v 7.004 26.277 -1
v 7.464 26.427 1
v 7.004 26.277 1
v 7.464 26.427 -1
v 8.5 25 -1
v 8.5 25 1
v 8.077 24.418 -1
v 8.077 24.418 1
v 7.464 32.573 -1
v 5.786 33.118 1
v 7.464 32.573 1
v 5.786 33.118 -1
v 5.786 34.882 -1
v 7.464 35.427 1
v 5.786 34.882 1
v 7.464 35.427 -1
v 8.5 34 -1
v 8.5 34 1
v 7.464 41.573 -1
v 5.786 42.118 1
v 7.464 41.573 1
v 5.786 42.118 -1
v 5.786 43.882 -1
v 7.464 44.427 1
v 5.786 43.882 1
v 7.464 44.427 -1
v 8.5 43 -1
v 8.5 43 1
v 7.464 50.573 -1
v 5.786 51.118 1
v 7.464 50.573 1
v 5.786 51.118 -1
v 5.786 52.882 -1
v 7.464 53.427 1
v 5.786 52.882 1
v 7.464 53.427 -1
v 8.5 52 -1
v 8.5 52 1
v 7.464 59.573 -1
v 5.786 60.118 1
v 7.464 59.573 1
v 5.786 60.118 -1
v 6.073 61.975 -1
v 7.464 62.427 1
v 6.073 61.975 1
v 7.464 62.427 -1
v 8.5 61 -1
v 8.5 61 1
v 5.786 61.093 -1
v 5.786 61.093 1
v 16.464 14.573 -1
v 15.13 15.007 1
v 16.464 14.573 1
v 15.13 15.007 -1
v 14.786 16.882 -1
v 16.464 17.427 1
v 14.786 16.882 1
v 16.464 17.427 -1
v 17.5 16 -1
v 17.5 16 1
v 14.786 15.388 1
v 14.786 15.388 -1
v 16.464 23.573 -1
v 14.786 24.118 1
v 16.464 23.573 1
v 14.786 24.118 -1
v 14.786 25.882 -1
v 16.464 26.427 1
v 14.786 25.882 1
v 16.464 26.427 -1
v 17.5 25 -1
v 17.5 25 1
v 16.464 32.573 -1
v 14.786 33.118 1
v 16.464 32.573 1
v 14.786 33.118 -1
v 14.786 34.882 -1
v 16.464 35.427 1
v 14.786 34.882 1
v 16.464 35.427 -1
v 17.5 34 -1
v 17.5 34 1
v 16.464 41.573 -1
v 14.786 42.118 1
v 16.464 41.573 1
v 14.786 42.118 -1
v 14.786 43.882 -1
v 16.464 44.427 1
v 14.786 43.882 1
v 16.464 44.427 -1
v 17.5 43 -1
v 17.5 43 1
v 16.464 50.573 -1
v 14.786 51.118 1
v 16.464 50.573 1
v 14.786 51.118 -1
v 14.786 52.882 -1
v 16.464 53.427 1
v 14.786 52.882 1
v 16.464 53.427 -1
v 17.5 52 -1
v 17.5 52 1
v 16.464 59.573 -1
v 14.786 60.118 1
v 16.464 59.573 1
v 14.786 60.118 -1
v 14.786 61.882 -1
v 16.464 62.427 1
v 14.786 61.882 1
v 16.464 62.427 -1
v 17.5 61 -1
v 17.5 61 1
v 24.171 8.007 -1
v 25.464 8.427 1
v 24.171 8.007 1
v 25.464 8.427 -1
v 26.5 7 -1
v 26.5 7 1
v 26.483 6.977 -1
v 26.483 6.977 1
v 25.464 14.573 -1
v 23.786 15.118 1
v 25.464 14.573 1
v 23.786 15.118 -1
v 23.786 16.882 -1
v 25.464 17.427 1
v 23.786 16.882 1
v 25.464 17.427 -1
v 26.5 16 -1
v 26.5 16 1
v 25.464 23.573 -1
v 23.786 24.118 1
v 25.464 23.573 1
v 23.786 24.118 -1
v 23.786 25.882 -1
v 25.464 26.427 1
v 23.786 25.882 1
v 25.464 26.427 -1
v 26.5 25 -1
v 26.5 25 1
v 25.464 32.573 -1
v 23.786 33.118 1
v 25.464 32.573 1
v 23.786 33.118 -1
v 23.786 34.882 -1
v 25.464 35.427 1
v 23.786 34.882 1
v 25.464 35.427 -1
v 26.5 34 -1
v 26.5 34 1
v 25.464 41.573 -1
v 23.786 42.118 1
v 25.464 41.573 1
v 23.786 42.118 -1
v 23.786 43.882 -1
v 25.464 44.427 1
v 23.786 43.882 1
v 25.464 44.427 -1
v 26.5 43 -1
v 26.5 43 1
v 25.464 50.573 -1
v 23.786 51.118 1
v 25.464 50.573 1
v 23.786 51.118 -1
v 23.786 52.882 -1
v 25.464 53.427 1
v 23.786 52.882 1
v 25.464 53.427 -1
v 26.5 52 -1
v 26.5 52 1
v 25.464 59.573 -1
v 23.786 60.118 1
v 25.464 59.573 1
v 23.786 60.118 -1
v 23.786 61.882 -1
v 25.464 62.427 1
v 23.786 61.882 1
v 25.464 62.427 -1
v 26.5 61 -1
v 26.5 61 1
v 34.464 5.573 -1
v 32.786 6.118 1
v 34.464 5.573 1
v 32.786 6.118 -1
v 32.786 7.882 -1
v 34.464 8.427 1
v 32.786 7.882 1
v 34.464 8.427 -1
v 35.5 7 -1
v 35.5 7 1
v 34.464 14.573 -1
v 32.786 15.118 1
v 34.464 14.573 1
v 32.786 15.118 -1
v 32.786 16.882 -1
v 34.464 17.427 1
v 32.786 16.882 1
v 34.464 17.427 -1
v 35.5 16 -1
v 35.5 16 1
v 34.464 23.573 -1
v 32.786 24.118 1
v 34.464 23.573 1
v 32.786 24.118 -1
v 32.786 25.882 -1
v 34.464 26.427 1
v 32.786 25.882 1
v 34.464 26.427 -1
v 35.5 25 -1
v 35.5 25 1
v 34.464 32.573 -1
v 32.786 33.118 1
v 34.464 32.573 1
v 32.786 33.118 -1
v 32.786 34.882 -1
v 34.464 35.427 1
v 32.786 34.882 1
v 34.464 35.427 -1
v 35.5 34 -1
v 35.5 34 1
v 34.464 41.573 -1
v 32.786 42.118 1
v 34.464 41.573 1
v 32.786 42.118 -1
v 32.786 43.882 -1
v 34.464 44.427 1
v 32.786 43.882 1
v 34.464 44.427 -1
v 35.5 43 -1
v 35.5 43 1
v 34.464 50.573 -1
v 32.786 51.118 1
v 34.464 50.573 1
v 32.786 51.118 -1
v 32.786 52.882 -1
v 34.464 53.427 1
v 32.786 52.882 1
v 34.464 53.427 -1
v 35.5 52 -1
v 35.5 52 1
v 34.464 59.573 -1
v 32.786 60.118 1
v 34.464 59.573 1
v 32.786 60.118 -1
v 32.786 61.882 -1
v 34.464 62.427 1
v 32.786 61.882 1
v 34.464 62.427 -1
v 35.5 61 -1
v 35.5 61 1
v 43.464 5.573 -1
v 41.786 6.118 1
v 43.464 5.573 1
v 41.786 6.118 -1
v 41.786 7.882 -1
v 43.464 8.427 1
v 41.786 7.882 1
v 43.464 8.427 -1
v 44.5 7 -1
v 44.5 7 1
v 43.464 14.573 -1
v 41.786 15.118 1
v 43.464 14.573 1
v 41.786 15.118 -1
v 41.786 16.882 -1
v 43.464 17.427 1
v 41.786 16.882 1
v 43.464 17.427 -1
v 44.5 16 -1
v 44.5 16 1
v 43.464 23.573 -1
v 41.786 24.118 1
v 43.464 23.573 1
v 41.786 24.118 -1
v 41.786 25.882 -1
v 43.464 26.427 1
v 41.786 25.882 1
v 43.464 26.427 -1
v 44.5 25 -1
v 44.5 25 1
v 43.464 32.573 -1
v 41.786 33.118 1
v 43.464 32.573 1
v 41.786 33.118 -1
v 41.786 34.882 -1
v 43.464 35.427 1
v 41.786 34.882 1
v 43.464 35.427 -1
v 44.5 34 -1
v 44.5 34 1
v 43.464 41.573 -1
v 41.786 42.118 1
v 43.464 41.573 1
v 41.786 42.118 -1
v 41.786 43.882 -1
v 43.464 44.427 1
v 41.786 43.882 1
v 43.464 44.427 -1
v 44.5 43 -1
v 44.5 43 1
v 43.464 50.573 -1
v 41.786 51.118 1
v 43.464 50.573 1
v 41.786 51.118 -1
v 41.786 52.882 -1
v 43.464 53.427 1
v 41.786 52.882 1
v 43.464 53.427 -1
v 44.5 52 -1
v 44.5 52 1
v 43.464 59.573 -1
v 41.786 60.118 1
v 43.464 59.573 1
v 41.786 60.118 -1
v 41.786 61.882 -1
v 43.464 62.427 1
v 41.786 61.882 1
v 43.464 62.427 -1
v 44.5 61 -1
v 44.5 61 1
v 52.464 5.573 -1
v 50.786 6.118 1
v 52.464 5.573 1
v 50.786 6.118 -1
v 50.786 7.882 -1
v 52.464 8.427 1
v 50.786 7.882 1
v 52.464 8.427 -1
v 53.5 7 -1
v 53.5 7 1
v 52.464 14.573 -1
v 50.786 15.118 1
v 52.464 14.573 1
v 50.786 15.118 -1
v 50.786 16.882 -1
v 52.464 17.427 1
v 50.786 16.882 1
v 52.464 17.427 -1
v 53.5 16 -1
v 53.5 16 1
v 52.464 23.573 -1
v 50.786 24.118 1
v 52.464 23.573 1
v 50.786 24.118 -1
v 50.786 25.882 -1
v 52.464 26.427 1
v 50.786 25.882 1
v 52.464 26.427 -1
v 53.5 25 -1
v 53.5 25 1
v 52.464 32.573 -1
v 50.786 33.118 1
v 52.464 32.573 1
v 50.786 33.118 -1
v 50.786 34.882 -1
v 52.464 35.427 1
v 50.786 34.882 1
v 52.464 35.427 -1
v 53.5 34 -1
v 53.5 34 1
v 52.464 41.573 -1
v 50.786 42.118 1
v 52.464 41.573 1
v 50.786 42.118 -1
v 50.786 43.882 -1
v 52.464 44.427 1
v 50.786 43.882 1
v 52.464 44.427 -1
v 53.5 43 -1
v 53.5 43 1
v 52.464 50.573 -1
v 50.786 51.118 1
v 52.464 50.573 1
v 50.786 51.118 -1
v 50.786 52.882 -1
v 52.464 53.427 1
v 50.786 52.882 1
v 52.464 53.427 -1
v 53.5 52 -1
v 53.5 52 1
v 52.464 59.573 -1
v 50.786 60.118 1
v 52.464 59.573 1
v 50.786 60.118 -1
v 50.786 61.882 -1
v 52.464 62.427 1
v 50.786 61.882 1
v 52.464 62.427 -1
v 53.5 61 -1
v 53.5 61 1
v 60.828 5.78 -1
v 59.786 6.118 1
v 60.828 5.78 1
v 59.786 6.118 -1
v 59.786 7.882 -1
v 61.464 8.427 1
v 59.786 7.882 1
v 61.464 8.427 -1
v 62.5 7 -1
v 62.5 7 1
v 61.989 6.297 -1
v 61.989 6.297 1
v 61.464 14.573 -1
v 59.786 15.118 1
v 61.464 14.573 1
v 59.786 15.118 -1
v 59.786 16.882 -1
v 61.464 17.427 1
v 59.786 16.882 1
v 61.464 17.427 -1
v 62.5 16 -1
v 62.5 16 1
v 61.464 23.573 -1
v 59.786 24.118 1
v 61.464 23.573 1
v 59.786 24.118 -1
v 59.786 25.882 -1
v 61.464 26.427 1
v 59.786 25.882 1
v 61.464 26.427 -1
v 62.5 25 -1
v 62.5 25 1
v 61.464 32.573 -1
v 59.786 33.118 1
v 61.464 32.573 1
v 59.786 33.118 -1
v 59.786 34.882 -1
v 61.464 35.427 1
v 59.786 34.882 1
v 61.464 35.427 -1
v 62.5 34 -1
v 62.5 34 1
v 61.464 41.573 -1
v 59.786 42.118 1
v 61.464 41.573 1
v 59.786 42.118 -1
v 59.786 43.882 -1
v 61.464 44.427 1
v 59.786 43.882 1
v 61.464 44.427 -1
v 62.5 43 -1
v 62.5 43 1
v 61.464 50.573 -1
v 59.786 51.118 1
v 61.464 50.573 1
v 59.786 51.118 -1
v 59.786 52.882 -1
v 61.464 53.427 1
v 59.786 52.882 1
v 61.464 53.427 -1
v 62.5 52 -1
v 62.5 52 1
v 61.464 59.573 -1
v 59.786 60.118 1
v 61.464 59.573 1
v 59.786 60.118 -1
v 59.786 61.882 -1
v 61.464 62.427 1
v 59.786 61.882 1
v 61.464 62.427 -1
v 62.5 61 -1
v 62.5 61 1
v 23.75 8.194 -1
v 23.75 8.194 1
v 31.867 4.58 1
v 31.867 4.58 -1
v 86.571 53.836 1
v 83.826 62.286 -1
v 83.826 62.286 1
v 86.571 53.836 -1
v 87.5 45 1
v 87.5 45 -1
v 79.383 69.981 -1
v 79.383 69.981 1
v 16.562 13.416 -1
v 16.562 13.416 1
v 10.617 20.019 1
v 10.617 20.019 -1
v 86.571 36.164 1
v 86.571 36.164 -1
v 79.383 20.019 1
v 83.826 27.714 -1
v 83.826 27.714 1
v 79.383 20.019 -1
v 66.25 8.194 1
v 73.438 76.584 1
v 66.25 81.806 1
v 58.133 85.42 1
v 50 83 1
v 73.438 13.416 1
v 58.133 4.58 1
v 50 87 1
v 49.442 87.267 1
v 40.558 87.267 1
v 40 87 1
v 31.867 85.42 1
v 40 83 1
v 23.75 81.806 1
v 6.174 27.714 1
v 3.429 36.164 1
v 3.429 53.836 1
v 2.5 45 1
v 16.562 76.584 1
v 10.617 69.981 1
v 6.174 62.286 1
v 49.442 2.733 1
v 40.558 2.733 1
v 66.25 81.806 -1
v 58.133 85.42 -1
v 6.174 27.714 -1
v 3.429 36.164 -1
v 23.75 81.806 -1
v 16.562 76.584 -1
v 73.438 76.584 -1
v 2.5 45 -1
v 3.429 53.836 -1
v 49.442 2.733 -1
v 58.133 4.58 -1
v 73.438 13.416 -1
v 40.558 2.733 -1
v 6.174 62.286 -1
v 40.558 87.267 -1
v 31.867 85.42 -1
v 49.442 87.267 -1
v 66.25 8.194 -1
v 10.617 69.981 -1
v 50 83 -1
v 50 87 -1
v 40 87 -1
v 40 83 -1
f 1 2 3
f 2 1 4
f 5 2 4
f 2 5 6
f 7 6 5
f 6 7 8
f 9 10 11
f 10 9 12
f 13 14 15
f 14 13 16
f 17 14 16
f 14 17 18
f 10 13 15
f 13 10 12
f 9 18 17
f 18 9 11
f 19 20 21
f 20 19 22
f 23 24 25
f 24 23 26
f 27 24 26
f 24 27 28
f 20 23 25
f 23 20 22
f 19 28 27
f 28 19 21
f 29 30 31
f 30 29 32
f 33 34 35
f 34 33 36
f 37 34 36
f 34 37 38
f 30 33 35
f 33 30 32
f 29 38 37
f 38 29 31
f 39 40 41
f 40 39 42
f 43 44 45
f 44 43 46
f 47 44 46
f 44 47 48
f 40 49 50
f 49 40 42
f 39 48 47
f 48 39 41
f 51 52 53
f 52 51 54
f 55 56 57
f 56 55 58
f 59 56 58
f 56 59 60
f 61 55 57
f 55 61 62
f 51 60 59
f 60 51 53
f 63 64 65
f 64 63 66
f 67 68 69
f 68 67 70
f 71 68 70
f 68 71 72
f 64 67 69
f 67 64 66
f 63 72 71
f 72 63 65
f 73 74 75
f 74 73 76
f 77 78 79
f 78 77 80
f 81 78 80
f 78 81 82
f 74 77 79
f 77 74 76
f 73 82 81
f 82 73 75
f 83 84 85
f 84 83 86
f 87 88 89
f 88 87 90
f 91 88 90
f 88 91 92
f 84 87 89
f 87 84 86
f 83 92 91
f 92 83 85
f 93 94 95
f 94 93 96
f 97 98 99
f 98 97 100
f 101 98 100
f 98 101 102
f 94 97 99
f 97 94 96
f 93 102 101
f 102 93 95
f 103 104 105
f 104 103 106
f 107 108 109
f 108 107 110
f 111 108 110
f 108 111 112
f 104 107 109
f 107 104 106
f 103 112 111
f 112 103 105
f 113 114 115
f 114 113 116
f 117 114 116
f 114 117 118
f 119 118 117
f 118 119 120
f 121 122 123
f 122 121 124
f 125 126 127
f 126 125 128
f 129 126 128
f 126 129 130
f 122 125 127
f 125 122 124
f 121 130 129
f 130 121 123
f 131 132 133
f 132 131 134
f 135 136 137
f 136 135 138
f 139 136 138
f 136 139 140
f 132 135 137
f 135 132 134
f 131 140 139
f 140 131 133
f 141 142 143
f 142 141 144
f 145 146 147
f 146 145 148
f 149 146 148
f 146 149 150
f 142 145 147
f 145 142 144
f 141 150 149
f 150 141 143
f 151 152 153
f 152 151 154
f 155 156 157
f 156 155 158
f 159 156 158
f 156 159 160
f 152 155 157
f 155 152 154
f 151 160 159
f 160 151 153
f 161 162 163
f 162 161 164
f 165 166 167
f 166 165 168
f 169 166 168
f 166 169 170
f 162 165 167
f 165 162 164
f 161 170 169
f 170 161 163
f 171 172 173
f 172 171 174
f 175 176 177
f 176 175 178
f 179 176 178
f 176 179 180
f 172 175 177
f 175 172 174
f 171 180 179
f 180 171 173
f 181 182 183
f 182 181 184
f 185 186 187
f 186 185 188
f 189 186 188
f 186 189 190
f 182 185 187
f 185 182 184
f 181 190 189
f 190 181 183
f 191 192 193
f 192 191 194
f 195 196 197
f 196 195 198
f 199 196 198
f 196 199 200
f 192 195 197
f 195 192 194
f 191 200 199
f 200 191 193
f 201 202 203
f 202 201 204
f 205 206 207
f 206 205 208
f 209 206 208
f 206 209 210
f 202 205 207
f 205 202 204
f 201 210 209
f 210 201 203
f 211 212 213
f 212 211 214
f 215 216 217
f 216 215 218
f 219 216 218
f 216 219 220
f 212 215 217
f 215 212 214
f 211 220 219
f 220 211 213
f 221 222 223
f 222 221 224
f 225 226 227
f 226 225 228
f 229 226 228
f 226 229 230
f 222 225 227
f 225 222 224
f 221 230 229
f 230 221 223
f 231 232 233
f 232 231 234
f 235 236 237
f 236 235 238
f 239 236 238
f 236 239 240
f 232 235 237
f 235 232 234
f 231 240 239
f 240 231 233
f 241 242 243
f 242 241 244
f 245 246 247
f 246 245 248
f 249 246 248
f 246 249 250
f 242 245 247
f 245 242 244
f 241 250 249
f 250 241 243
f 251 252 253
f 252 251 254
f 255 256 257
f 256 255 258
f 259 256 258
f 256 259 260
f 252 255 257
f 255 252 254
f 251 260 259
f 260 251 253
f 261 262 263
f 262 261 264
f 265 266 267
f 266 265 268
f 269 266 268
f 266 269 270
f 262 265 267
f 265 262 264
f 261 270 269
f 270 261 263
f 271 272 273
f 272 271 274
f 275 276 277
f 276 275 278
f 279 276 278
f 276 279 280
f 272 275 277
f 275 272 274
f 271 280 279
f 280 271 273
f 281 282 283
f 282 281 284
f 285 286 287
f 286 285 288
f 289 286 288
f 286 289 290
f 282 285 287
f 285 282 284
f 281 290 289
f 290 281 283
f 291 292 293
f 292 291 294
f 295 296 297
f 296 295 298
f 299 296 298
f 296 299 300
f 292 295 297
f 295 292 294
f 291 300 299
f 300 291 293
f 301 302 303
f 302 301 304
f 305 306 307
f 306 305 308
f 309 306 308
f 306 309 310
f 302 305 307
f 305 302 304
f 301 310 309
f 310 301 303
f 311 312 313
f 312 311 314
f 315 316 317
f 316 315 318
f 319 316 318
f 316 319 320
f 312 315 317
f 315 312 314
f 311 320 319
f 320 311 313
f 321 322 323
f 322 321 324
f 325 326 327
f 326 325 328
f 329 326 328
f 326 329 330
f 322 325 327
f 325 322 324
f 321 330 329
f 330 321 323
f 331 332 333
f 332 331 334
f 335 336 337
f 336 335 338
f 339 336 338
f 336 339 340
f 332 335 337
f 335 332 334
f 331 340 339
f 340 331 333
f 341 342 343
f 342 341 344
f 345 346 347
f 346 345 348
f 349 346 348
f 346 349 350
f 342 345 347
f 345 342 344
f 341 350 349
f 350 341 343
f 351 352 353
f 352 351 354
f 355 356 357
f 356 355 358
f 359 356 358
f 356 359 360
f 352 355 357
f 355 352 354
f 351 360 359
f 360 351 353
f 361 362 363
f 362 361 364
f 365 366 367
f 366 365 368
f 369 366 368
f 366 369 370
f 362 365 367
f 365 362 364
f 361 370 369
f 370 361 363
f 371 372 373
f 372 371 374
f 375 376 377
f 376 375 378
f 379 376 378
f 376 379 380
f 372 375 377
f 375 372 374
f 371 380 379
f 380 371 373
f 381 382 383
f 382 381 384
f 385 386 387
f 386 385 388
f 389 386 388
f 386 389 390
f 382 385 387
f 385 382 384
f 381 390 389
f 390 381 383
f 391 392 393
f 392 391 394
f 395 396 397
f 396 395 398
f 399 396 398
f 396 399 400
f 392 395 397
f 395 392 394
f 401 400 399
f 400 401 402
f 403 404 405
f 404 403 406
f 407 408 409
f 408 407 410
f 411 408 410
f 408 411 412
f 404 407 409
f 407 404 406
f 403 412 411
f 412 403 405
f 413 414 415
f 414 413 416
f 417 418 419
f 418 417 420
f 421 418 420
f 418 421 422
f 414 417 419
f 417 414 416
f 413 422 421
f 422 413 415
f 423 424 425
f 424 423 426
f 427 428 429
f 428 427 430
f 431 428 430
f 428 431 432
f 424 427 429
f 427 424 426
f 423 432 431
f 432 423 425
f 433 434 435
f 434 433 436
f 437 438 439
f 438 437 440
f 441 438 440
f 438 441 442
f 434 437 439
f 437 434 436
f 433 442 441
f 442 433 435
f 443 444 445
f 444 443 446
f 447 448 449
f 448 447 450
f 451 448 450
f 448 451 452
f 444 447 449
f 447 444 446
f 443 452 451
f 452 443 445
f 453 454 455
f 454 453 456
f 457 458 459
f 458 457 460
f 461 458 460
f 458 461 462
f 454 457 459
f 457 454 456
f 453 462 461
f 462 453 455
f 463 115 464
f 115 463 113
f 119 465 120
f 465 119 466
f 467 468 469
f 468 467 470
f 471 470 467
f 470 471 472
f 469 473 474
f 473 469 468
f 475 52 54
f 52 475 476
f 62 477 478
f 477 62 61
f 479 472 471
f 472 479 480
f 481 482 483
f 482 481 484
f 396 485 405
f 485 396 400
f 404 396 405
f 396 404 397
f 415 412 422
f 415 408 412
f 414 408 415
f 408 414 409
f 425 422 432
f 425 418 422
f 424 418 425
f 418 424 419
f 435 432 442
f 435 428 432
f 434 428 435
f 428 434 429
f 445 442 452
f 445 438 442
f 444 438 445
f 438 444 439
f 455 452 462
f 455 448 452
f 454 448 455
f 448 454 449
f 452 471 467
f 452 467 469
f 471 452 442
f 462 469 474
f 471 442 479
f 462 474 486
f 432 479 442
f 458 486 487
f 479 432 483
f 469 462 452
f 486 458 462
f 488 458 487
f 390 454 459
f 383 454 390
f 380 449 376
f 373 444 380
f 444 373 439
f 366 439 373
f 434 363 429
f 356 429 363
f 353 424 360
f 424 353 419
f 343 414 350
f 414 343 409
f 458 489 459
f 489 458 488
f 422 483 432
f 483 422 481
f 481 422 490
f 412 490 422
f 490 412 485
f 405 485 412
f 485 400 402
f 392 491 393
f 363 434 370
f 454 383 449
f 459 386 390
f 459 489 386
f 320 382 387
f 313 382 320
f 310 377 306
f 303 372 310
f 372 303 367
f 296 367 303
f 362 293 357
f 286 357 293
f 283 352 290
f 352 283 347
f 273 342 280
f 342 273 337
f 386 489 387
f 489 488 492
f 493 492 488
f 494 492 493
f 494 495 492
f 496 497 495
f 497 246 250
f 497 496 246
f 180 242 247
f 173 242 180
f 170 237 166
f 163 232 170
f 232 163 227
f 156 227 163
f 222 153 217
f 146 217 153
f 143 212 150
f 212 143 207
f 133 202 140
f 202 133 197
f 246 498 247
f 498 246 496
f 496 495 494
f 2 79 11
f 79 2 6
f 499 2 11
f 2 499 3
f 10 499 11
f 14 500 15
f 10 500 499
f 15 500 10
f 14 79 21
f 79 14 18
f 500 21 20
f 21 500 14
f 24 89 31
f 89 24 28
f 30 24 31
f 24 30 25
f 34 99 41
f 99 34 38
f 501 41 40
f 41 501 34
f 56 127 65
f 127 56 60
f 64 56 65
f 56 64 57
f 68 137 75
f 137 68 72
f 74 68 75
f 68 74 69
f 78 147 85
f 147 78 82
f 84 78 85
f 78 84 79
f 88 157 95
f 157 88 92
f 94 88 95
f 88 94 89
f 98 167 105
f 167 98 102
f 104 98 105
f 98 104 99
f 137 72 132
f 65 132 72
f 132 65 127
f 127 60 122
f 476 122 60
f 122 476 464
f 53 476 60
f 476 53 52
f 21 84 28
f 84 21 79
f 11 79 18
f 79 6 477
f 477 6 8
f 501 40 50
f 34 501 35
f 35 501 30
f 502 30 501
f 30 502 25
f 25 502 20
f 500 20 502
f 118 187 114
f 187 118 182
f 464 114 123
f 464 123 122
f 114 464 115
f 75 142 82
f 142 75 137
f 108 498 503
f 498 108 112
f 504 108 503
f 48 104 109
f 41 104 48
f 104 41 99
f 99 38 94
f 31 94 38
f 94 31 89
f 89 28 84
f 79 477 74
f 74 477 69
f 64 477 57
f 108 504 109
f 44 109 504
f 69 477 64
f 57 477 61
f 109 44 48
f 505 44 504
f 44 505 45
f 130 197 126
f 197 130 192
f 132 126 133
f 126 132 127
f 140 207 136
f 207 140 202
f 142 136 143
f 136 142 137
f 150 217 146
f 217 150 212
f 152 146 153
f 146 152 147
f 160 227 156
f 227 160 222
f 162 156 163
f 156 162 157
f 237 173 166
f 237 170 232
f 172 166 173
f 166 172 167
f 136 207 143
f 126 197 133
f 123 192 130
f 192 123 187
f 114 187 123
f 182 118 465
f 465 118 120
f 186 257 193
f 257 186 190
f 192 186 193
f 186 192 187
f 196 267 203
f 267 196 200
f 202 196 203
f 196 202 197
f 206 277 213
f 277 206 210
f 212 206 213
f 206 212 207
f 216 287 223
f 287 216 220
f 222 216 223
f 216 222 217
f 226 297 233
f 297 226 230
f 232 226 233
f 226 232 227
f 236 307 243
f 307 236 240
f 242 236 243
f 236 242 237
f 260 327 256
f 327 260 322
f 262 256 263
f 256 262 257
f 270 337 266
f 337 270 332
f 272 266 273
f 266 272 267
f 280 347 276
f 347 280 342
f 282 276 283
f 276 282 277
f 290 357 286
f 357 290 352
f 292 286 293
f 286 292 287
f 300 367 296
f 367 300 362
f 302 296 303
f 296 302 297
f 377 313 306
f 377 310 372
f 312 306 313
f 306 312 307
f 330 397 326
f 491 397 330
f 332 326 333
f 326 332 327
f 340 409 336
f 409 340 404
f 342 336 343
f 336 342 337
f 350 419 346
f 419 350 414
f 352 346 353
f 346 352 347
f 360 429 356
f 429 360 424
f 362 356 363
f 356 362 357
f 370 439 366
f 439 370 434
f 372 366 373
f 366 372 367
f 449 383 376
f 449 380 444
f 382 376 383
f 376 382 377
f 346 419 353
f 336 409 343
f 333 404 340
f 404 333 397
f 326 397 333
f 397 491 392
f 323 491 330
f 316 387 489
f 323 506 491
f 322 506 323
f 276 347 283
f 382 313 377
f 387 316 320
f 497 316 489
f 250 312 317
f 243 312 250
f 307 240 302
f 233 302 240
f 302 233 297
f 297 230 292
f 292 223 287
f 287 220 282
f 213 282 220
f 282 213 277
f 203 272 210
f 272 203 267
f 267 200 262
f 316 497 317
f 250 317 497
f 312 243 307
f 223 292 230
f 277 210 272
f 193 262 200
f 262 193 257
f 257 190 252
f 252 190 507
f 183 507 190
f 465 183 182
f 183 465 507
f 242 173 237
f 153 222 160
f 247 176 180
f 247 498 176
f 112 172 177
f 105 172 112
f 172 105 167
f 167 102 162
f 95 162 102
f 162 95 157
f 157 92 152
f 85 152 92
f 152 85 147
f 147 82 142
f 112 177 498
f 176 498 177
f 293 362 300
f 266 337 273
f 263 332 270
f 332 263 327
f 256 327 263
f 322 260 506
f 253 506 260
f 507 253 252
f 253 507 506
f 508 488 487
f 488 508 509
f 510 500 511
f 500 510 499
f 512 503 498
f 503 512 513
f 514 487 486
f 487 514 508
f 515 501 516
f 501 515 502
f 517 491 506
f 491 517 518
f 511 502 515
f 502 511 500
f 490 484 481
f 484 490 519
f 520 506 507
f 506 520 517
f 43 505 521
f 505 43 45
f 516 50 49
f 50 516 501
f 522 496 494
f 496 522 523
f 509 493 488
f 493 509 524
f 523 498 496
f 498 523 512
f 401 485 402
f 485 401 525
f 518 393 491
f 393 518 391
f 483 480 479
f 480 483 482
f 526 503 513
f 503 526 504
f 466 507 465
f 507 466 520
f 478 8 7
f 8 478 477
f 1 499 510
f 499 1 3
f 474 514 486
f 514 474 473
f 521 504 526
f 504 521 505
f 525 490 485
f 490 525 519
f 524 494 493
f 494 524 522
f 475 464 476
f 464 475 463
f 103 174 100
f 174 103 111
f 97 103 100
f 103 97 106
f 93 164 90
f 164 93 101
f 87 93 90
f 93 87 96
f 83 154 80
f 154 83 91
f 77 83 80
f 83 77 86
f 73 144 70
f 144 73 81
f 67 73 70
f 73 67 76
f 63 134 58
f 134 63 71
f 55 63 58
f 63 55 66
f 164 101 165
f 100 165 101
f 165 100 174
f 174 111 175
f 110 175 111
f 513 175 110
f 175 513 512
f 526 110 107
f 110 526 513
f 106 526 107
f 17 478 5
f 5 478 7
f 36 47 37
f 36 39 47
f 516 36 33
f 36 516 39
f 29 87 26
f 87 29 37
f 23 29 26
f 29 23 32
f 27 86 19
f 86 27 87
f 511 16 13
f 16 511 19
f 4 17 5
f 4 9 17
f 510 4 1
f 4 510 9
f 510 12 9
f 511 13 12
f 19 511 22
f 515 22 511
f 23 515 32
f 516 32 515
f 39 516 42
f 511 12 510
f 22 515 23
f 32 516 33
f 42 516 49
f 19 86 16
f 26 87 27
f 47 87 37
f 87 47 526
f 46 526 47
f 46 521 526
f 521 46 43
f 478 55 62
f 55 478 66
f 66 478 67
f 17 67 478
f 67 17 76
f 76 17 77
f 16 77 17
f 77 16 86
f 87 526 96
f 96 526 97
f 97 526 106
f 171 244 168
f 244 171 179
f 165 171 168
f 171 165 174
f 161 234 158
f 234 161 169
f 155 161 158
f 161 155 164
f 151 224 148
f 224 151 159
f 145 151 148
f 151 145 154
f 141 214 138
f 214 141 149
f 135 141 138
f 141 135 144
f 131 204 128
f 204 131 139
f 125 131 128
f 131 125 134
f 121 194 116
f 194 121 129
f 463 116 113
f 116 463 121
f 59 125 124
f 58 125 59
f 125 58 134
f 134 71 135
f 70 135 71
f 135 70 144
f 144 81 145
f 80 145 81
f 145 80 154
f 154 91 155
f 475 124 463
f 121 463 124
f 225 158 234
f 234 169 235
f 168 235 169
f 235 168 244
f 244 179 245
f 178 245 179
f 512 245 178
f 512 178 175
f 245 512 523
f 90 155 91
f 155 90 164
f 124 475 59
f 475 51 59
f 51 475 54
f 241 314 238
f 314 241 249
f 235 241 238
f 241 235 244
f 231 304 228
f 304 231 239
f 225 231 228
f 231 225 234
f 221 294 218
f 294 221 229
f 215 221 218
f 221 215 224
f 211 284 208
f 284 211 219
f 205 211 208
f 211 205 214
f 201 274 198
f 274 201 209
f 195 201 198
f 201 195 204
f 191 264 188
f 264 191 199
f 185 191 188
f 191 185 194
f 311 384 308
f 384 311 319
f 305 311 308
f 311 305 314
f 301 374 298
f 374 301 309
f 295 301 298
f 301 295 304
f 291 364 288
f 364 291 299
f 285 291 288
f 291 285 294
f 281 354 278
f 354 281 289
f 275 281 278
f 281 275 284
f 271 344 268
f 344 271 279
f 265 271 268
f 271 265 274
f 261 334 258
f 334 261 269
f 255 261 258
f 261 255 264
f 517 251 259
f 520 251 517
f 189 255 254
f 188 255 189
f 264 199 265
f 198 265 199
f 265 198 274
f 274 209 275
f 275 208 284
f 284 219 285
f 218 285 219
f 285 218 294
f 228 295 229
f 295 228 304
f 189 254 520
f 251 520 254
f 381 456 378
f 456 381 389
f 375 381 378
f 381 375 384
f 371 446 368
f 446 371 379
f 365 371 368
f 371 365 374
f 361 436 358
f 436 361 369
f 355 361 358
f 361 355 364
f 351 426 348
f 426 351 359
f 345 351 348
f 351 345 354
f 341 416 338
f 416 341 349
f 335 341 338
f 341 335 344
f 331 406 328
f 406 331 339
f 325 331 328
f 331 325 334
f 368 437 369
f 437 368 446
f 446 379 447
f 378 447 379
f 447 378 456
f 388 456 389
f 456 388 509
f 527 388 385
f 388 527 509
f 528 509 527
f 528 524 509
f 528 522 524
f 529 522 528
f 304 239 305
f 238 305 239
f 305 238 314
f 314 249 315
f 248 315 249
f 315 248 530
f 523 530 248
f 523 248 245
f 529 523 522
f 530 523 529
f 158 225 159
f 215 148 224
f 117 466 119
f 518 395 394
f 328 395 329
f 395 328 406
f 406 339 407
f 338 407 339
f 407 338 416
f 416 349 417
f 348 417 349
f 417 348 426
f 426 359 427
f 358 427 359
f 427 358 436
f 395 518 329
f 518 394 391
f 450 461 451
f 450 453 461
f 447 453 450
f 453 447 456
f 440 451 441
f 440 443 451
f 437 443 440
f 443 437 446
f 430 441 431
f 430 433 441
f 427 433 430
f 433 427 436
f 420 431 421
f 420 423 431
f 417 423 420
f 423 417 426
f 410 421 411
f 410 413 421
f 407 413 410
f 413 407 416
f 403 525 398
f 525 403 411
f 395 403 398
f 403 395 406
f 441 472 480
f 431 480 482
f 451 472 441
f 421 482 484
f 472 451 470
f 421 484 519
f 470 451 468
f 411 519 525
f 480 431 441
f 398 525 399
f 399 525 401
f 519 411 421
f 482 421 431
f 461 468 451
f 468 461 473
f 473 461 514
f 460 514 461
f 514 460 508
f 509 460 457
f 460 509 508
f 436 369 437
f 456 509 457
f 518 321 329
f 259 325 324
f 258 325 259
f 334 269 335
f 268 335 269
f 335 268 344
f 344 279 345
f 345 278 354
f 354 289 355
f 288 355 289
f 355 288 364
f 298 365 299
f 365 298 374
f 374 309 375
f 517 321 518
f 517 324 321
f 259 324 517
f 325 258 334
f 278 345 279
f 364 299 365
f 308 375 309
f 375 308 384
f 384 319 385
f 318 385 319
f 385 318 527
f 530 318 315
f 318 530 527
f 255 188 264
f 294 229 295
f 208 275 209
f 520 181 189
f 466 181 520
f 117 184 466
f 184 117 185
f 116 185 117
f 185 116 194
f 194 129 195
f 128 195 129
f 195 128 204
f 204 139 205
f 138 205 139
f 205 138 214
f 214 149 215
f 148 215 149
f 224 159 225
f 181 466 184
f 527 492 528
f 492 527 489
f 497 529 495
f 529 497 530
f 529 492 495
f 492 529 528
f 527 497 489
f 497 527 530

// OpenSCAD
// Dimensions
dish_diameter = 90;
template_diameter = 85;
template_thickness = 2;
hole_diameter = 3;
hole_spacing = 9;
notch_width = 10;
notch_depth = 4;

// Center the model on the origin
translate([dish_diameter / 2, dish_diameter / 2, 0]) {
    // Flat disc
    difference() {
        cylinder(r = template_diameter / 2, h = template_thickness, center = true);
        // Holes
        for (i = [0:6]) {
            for (j = [0:6]) {
                translate([i * hole_spacing - template_diameter / 2 + hole_spacing / 2, j * hole_spacing - template_diameter / 2 + hole_spacing / 2, 0])
                    cylinder(r = hole_diameter / 2, h = template_thickness + 0.1, center = true);
            }
        }
        // Notch
        translate([0, dish_diameter / 2 - notch_width / 2, 0])
            cube([notch_width, notch_depth, template_thickness + 0.1], center = true);
    }
}
